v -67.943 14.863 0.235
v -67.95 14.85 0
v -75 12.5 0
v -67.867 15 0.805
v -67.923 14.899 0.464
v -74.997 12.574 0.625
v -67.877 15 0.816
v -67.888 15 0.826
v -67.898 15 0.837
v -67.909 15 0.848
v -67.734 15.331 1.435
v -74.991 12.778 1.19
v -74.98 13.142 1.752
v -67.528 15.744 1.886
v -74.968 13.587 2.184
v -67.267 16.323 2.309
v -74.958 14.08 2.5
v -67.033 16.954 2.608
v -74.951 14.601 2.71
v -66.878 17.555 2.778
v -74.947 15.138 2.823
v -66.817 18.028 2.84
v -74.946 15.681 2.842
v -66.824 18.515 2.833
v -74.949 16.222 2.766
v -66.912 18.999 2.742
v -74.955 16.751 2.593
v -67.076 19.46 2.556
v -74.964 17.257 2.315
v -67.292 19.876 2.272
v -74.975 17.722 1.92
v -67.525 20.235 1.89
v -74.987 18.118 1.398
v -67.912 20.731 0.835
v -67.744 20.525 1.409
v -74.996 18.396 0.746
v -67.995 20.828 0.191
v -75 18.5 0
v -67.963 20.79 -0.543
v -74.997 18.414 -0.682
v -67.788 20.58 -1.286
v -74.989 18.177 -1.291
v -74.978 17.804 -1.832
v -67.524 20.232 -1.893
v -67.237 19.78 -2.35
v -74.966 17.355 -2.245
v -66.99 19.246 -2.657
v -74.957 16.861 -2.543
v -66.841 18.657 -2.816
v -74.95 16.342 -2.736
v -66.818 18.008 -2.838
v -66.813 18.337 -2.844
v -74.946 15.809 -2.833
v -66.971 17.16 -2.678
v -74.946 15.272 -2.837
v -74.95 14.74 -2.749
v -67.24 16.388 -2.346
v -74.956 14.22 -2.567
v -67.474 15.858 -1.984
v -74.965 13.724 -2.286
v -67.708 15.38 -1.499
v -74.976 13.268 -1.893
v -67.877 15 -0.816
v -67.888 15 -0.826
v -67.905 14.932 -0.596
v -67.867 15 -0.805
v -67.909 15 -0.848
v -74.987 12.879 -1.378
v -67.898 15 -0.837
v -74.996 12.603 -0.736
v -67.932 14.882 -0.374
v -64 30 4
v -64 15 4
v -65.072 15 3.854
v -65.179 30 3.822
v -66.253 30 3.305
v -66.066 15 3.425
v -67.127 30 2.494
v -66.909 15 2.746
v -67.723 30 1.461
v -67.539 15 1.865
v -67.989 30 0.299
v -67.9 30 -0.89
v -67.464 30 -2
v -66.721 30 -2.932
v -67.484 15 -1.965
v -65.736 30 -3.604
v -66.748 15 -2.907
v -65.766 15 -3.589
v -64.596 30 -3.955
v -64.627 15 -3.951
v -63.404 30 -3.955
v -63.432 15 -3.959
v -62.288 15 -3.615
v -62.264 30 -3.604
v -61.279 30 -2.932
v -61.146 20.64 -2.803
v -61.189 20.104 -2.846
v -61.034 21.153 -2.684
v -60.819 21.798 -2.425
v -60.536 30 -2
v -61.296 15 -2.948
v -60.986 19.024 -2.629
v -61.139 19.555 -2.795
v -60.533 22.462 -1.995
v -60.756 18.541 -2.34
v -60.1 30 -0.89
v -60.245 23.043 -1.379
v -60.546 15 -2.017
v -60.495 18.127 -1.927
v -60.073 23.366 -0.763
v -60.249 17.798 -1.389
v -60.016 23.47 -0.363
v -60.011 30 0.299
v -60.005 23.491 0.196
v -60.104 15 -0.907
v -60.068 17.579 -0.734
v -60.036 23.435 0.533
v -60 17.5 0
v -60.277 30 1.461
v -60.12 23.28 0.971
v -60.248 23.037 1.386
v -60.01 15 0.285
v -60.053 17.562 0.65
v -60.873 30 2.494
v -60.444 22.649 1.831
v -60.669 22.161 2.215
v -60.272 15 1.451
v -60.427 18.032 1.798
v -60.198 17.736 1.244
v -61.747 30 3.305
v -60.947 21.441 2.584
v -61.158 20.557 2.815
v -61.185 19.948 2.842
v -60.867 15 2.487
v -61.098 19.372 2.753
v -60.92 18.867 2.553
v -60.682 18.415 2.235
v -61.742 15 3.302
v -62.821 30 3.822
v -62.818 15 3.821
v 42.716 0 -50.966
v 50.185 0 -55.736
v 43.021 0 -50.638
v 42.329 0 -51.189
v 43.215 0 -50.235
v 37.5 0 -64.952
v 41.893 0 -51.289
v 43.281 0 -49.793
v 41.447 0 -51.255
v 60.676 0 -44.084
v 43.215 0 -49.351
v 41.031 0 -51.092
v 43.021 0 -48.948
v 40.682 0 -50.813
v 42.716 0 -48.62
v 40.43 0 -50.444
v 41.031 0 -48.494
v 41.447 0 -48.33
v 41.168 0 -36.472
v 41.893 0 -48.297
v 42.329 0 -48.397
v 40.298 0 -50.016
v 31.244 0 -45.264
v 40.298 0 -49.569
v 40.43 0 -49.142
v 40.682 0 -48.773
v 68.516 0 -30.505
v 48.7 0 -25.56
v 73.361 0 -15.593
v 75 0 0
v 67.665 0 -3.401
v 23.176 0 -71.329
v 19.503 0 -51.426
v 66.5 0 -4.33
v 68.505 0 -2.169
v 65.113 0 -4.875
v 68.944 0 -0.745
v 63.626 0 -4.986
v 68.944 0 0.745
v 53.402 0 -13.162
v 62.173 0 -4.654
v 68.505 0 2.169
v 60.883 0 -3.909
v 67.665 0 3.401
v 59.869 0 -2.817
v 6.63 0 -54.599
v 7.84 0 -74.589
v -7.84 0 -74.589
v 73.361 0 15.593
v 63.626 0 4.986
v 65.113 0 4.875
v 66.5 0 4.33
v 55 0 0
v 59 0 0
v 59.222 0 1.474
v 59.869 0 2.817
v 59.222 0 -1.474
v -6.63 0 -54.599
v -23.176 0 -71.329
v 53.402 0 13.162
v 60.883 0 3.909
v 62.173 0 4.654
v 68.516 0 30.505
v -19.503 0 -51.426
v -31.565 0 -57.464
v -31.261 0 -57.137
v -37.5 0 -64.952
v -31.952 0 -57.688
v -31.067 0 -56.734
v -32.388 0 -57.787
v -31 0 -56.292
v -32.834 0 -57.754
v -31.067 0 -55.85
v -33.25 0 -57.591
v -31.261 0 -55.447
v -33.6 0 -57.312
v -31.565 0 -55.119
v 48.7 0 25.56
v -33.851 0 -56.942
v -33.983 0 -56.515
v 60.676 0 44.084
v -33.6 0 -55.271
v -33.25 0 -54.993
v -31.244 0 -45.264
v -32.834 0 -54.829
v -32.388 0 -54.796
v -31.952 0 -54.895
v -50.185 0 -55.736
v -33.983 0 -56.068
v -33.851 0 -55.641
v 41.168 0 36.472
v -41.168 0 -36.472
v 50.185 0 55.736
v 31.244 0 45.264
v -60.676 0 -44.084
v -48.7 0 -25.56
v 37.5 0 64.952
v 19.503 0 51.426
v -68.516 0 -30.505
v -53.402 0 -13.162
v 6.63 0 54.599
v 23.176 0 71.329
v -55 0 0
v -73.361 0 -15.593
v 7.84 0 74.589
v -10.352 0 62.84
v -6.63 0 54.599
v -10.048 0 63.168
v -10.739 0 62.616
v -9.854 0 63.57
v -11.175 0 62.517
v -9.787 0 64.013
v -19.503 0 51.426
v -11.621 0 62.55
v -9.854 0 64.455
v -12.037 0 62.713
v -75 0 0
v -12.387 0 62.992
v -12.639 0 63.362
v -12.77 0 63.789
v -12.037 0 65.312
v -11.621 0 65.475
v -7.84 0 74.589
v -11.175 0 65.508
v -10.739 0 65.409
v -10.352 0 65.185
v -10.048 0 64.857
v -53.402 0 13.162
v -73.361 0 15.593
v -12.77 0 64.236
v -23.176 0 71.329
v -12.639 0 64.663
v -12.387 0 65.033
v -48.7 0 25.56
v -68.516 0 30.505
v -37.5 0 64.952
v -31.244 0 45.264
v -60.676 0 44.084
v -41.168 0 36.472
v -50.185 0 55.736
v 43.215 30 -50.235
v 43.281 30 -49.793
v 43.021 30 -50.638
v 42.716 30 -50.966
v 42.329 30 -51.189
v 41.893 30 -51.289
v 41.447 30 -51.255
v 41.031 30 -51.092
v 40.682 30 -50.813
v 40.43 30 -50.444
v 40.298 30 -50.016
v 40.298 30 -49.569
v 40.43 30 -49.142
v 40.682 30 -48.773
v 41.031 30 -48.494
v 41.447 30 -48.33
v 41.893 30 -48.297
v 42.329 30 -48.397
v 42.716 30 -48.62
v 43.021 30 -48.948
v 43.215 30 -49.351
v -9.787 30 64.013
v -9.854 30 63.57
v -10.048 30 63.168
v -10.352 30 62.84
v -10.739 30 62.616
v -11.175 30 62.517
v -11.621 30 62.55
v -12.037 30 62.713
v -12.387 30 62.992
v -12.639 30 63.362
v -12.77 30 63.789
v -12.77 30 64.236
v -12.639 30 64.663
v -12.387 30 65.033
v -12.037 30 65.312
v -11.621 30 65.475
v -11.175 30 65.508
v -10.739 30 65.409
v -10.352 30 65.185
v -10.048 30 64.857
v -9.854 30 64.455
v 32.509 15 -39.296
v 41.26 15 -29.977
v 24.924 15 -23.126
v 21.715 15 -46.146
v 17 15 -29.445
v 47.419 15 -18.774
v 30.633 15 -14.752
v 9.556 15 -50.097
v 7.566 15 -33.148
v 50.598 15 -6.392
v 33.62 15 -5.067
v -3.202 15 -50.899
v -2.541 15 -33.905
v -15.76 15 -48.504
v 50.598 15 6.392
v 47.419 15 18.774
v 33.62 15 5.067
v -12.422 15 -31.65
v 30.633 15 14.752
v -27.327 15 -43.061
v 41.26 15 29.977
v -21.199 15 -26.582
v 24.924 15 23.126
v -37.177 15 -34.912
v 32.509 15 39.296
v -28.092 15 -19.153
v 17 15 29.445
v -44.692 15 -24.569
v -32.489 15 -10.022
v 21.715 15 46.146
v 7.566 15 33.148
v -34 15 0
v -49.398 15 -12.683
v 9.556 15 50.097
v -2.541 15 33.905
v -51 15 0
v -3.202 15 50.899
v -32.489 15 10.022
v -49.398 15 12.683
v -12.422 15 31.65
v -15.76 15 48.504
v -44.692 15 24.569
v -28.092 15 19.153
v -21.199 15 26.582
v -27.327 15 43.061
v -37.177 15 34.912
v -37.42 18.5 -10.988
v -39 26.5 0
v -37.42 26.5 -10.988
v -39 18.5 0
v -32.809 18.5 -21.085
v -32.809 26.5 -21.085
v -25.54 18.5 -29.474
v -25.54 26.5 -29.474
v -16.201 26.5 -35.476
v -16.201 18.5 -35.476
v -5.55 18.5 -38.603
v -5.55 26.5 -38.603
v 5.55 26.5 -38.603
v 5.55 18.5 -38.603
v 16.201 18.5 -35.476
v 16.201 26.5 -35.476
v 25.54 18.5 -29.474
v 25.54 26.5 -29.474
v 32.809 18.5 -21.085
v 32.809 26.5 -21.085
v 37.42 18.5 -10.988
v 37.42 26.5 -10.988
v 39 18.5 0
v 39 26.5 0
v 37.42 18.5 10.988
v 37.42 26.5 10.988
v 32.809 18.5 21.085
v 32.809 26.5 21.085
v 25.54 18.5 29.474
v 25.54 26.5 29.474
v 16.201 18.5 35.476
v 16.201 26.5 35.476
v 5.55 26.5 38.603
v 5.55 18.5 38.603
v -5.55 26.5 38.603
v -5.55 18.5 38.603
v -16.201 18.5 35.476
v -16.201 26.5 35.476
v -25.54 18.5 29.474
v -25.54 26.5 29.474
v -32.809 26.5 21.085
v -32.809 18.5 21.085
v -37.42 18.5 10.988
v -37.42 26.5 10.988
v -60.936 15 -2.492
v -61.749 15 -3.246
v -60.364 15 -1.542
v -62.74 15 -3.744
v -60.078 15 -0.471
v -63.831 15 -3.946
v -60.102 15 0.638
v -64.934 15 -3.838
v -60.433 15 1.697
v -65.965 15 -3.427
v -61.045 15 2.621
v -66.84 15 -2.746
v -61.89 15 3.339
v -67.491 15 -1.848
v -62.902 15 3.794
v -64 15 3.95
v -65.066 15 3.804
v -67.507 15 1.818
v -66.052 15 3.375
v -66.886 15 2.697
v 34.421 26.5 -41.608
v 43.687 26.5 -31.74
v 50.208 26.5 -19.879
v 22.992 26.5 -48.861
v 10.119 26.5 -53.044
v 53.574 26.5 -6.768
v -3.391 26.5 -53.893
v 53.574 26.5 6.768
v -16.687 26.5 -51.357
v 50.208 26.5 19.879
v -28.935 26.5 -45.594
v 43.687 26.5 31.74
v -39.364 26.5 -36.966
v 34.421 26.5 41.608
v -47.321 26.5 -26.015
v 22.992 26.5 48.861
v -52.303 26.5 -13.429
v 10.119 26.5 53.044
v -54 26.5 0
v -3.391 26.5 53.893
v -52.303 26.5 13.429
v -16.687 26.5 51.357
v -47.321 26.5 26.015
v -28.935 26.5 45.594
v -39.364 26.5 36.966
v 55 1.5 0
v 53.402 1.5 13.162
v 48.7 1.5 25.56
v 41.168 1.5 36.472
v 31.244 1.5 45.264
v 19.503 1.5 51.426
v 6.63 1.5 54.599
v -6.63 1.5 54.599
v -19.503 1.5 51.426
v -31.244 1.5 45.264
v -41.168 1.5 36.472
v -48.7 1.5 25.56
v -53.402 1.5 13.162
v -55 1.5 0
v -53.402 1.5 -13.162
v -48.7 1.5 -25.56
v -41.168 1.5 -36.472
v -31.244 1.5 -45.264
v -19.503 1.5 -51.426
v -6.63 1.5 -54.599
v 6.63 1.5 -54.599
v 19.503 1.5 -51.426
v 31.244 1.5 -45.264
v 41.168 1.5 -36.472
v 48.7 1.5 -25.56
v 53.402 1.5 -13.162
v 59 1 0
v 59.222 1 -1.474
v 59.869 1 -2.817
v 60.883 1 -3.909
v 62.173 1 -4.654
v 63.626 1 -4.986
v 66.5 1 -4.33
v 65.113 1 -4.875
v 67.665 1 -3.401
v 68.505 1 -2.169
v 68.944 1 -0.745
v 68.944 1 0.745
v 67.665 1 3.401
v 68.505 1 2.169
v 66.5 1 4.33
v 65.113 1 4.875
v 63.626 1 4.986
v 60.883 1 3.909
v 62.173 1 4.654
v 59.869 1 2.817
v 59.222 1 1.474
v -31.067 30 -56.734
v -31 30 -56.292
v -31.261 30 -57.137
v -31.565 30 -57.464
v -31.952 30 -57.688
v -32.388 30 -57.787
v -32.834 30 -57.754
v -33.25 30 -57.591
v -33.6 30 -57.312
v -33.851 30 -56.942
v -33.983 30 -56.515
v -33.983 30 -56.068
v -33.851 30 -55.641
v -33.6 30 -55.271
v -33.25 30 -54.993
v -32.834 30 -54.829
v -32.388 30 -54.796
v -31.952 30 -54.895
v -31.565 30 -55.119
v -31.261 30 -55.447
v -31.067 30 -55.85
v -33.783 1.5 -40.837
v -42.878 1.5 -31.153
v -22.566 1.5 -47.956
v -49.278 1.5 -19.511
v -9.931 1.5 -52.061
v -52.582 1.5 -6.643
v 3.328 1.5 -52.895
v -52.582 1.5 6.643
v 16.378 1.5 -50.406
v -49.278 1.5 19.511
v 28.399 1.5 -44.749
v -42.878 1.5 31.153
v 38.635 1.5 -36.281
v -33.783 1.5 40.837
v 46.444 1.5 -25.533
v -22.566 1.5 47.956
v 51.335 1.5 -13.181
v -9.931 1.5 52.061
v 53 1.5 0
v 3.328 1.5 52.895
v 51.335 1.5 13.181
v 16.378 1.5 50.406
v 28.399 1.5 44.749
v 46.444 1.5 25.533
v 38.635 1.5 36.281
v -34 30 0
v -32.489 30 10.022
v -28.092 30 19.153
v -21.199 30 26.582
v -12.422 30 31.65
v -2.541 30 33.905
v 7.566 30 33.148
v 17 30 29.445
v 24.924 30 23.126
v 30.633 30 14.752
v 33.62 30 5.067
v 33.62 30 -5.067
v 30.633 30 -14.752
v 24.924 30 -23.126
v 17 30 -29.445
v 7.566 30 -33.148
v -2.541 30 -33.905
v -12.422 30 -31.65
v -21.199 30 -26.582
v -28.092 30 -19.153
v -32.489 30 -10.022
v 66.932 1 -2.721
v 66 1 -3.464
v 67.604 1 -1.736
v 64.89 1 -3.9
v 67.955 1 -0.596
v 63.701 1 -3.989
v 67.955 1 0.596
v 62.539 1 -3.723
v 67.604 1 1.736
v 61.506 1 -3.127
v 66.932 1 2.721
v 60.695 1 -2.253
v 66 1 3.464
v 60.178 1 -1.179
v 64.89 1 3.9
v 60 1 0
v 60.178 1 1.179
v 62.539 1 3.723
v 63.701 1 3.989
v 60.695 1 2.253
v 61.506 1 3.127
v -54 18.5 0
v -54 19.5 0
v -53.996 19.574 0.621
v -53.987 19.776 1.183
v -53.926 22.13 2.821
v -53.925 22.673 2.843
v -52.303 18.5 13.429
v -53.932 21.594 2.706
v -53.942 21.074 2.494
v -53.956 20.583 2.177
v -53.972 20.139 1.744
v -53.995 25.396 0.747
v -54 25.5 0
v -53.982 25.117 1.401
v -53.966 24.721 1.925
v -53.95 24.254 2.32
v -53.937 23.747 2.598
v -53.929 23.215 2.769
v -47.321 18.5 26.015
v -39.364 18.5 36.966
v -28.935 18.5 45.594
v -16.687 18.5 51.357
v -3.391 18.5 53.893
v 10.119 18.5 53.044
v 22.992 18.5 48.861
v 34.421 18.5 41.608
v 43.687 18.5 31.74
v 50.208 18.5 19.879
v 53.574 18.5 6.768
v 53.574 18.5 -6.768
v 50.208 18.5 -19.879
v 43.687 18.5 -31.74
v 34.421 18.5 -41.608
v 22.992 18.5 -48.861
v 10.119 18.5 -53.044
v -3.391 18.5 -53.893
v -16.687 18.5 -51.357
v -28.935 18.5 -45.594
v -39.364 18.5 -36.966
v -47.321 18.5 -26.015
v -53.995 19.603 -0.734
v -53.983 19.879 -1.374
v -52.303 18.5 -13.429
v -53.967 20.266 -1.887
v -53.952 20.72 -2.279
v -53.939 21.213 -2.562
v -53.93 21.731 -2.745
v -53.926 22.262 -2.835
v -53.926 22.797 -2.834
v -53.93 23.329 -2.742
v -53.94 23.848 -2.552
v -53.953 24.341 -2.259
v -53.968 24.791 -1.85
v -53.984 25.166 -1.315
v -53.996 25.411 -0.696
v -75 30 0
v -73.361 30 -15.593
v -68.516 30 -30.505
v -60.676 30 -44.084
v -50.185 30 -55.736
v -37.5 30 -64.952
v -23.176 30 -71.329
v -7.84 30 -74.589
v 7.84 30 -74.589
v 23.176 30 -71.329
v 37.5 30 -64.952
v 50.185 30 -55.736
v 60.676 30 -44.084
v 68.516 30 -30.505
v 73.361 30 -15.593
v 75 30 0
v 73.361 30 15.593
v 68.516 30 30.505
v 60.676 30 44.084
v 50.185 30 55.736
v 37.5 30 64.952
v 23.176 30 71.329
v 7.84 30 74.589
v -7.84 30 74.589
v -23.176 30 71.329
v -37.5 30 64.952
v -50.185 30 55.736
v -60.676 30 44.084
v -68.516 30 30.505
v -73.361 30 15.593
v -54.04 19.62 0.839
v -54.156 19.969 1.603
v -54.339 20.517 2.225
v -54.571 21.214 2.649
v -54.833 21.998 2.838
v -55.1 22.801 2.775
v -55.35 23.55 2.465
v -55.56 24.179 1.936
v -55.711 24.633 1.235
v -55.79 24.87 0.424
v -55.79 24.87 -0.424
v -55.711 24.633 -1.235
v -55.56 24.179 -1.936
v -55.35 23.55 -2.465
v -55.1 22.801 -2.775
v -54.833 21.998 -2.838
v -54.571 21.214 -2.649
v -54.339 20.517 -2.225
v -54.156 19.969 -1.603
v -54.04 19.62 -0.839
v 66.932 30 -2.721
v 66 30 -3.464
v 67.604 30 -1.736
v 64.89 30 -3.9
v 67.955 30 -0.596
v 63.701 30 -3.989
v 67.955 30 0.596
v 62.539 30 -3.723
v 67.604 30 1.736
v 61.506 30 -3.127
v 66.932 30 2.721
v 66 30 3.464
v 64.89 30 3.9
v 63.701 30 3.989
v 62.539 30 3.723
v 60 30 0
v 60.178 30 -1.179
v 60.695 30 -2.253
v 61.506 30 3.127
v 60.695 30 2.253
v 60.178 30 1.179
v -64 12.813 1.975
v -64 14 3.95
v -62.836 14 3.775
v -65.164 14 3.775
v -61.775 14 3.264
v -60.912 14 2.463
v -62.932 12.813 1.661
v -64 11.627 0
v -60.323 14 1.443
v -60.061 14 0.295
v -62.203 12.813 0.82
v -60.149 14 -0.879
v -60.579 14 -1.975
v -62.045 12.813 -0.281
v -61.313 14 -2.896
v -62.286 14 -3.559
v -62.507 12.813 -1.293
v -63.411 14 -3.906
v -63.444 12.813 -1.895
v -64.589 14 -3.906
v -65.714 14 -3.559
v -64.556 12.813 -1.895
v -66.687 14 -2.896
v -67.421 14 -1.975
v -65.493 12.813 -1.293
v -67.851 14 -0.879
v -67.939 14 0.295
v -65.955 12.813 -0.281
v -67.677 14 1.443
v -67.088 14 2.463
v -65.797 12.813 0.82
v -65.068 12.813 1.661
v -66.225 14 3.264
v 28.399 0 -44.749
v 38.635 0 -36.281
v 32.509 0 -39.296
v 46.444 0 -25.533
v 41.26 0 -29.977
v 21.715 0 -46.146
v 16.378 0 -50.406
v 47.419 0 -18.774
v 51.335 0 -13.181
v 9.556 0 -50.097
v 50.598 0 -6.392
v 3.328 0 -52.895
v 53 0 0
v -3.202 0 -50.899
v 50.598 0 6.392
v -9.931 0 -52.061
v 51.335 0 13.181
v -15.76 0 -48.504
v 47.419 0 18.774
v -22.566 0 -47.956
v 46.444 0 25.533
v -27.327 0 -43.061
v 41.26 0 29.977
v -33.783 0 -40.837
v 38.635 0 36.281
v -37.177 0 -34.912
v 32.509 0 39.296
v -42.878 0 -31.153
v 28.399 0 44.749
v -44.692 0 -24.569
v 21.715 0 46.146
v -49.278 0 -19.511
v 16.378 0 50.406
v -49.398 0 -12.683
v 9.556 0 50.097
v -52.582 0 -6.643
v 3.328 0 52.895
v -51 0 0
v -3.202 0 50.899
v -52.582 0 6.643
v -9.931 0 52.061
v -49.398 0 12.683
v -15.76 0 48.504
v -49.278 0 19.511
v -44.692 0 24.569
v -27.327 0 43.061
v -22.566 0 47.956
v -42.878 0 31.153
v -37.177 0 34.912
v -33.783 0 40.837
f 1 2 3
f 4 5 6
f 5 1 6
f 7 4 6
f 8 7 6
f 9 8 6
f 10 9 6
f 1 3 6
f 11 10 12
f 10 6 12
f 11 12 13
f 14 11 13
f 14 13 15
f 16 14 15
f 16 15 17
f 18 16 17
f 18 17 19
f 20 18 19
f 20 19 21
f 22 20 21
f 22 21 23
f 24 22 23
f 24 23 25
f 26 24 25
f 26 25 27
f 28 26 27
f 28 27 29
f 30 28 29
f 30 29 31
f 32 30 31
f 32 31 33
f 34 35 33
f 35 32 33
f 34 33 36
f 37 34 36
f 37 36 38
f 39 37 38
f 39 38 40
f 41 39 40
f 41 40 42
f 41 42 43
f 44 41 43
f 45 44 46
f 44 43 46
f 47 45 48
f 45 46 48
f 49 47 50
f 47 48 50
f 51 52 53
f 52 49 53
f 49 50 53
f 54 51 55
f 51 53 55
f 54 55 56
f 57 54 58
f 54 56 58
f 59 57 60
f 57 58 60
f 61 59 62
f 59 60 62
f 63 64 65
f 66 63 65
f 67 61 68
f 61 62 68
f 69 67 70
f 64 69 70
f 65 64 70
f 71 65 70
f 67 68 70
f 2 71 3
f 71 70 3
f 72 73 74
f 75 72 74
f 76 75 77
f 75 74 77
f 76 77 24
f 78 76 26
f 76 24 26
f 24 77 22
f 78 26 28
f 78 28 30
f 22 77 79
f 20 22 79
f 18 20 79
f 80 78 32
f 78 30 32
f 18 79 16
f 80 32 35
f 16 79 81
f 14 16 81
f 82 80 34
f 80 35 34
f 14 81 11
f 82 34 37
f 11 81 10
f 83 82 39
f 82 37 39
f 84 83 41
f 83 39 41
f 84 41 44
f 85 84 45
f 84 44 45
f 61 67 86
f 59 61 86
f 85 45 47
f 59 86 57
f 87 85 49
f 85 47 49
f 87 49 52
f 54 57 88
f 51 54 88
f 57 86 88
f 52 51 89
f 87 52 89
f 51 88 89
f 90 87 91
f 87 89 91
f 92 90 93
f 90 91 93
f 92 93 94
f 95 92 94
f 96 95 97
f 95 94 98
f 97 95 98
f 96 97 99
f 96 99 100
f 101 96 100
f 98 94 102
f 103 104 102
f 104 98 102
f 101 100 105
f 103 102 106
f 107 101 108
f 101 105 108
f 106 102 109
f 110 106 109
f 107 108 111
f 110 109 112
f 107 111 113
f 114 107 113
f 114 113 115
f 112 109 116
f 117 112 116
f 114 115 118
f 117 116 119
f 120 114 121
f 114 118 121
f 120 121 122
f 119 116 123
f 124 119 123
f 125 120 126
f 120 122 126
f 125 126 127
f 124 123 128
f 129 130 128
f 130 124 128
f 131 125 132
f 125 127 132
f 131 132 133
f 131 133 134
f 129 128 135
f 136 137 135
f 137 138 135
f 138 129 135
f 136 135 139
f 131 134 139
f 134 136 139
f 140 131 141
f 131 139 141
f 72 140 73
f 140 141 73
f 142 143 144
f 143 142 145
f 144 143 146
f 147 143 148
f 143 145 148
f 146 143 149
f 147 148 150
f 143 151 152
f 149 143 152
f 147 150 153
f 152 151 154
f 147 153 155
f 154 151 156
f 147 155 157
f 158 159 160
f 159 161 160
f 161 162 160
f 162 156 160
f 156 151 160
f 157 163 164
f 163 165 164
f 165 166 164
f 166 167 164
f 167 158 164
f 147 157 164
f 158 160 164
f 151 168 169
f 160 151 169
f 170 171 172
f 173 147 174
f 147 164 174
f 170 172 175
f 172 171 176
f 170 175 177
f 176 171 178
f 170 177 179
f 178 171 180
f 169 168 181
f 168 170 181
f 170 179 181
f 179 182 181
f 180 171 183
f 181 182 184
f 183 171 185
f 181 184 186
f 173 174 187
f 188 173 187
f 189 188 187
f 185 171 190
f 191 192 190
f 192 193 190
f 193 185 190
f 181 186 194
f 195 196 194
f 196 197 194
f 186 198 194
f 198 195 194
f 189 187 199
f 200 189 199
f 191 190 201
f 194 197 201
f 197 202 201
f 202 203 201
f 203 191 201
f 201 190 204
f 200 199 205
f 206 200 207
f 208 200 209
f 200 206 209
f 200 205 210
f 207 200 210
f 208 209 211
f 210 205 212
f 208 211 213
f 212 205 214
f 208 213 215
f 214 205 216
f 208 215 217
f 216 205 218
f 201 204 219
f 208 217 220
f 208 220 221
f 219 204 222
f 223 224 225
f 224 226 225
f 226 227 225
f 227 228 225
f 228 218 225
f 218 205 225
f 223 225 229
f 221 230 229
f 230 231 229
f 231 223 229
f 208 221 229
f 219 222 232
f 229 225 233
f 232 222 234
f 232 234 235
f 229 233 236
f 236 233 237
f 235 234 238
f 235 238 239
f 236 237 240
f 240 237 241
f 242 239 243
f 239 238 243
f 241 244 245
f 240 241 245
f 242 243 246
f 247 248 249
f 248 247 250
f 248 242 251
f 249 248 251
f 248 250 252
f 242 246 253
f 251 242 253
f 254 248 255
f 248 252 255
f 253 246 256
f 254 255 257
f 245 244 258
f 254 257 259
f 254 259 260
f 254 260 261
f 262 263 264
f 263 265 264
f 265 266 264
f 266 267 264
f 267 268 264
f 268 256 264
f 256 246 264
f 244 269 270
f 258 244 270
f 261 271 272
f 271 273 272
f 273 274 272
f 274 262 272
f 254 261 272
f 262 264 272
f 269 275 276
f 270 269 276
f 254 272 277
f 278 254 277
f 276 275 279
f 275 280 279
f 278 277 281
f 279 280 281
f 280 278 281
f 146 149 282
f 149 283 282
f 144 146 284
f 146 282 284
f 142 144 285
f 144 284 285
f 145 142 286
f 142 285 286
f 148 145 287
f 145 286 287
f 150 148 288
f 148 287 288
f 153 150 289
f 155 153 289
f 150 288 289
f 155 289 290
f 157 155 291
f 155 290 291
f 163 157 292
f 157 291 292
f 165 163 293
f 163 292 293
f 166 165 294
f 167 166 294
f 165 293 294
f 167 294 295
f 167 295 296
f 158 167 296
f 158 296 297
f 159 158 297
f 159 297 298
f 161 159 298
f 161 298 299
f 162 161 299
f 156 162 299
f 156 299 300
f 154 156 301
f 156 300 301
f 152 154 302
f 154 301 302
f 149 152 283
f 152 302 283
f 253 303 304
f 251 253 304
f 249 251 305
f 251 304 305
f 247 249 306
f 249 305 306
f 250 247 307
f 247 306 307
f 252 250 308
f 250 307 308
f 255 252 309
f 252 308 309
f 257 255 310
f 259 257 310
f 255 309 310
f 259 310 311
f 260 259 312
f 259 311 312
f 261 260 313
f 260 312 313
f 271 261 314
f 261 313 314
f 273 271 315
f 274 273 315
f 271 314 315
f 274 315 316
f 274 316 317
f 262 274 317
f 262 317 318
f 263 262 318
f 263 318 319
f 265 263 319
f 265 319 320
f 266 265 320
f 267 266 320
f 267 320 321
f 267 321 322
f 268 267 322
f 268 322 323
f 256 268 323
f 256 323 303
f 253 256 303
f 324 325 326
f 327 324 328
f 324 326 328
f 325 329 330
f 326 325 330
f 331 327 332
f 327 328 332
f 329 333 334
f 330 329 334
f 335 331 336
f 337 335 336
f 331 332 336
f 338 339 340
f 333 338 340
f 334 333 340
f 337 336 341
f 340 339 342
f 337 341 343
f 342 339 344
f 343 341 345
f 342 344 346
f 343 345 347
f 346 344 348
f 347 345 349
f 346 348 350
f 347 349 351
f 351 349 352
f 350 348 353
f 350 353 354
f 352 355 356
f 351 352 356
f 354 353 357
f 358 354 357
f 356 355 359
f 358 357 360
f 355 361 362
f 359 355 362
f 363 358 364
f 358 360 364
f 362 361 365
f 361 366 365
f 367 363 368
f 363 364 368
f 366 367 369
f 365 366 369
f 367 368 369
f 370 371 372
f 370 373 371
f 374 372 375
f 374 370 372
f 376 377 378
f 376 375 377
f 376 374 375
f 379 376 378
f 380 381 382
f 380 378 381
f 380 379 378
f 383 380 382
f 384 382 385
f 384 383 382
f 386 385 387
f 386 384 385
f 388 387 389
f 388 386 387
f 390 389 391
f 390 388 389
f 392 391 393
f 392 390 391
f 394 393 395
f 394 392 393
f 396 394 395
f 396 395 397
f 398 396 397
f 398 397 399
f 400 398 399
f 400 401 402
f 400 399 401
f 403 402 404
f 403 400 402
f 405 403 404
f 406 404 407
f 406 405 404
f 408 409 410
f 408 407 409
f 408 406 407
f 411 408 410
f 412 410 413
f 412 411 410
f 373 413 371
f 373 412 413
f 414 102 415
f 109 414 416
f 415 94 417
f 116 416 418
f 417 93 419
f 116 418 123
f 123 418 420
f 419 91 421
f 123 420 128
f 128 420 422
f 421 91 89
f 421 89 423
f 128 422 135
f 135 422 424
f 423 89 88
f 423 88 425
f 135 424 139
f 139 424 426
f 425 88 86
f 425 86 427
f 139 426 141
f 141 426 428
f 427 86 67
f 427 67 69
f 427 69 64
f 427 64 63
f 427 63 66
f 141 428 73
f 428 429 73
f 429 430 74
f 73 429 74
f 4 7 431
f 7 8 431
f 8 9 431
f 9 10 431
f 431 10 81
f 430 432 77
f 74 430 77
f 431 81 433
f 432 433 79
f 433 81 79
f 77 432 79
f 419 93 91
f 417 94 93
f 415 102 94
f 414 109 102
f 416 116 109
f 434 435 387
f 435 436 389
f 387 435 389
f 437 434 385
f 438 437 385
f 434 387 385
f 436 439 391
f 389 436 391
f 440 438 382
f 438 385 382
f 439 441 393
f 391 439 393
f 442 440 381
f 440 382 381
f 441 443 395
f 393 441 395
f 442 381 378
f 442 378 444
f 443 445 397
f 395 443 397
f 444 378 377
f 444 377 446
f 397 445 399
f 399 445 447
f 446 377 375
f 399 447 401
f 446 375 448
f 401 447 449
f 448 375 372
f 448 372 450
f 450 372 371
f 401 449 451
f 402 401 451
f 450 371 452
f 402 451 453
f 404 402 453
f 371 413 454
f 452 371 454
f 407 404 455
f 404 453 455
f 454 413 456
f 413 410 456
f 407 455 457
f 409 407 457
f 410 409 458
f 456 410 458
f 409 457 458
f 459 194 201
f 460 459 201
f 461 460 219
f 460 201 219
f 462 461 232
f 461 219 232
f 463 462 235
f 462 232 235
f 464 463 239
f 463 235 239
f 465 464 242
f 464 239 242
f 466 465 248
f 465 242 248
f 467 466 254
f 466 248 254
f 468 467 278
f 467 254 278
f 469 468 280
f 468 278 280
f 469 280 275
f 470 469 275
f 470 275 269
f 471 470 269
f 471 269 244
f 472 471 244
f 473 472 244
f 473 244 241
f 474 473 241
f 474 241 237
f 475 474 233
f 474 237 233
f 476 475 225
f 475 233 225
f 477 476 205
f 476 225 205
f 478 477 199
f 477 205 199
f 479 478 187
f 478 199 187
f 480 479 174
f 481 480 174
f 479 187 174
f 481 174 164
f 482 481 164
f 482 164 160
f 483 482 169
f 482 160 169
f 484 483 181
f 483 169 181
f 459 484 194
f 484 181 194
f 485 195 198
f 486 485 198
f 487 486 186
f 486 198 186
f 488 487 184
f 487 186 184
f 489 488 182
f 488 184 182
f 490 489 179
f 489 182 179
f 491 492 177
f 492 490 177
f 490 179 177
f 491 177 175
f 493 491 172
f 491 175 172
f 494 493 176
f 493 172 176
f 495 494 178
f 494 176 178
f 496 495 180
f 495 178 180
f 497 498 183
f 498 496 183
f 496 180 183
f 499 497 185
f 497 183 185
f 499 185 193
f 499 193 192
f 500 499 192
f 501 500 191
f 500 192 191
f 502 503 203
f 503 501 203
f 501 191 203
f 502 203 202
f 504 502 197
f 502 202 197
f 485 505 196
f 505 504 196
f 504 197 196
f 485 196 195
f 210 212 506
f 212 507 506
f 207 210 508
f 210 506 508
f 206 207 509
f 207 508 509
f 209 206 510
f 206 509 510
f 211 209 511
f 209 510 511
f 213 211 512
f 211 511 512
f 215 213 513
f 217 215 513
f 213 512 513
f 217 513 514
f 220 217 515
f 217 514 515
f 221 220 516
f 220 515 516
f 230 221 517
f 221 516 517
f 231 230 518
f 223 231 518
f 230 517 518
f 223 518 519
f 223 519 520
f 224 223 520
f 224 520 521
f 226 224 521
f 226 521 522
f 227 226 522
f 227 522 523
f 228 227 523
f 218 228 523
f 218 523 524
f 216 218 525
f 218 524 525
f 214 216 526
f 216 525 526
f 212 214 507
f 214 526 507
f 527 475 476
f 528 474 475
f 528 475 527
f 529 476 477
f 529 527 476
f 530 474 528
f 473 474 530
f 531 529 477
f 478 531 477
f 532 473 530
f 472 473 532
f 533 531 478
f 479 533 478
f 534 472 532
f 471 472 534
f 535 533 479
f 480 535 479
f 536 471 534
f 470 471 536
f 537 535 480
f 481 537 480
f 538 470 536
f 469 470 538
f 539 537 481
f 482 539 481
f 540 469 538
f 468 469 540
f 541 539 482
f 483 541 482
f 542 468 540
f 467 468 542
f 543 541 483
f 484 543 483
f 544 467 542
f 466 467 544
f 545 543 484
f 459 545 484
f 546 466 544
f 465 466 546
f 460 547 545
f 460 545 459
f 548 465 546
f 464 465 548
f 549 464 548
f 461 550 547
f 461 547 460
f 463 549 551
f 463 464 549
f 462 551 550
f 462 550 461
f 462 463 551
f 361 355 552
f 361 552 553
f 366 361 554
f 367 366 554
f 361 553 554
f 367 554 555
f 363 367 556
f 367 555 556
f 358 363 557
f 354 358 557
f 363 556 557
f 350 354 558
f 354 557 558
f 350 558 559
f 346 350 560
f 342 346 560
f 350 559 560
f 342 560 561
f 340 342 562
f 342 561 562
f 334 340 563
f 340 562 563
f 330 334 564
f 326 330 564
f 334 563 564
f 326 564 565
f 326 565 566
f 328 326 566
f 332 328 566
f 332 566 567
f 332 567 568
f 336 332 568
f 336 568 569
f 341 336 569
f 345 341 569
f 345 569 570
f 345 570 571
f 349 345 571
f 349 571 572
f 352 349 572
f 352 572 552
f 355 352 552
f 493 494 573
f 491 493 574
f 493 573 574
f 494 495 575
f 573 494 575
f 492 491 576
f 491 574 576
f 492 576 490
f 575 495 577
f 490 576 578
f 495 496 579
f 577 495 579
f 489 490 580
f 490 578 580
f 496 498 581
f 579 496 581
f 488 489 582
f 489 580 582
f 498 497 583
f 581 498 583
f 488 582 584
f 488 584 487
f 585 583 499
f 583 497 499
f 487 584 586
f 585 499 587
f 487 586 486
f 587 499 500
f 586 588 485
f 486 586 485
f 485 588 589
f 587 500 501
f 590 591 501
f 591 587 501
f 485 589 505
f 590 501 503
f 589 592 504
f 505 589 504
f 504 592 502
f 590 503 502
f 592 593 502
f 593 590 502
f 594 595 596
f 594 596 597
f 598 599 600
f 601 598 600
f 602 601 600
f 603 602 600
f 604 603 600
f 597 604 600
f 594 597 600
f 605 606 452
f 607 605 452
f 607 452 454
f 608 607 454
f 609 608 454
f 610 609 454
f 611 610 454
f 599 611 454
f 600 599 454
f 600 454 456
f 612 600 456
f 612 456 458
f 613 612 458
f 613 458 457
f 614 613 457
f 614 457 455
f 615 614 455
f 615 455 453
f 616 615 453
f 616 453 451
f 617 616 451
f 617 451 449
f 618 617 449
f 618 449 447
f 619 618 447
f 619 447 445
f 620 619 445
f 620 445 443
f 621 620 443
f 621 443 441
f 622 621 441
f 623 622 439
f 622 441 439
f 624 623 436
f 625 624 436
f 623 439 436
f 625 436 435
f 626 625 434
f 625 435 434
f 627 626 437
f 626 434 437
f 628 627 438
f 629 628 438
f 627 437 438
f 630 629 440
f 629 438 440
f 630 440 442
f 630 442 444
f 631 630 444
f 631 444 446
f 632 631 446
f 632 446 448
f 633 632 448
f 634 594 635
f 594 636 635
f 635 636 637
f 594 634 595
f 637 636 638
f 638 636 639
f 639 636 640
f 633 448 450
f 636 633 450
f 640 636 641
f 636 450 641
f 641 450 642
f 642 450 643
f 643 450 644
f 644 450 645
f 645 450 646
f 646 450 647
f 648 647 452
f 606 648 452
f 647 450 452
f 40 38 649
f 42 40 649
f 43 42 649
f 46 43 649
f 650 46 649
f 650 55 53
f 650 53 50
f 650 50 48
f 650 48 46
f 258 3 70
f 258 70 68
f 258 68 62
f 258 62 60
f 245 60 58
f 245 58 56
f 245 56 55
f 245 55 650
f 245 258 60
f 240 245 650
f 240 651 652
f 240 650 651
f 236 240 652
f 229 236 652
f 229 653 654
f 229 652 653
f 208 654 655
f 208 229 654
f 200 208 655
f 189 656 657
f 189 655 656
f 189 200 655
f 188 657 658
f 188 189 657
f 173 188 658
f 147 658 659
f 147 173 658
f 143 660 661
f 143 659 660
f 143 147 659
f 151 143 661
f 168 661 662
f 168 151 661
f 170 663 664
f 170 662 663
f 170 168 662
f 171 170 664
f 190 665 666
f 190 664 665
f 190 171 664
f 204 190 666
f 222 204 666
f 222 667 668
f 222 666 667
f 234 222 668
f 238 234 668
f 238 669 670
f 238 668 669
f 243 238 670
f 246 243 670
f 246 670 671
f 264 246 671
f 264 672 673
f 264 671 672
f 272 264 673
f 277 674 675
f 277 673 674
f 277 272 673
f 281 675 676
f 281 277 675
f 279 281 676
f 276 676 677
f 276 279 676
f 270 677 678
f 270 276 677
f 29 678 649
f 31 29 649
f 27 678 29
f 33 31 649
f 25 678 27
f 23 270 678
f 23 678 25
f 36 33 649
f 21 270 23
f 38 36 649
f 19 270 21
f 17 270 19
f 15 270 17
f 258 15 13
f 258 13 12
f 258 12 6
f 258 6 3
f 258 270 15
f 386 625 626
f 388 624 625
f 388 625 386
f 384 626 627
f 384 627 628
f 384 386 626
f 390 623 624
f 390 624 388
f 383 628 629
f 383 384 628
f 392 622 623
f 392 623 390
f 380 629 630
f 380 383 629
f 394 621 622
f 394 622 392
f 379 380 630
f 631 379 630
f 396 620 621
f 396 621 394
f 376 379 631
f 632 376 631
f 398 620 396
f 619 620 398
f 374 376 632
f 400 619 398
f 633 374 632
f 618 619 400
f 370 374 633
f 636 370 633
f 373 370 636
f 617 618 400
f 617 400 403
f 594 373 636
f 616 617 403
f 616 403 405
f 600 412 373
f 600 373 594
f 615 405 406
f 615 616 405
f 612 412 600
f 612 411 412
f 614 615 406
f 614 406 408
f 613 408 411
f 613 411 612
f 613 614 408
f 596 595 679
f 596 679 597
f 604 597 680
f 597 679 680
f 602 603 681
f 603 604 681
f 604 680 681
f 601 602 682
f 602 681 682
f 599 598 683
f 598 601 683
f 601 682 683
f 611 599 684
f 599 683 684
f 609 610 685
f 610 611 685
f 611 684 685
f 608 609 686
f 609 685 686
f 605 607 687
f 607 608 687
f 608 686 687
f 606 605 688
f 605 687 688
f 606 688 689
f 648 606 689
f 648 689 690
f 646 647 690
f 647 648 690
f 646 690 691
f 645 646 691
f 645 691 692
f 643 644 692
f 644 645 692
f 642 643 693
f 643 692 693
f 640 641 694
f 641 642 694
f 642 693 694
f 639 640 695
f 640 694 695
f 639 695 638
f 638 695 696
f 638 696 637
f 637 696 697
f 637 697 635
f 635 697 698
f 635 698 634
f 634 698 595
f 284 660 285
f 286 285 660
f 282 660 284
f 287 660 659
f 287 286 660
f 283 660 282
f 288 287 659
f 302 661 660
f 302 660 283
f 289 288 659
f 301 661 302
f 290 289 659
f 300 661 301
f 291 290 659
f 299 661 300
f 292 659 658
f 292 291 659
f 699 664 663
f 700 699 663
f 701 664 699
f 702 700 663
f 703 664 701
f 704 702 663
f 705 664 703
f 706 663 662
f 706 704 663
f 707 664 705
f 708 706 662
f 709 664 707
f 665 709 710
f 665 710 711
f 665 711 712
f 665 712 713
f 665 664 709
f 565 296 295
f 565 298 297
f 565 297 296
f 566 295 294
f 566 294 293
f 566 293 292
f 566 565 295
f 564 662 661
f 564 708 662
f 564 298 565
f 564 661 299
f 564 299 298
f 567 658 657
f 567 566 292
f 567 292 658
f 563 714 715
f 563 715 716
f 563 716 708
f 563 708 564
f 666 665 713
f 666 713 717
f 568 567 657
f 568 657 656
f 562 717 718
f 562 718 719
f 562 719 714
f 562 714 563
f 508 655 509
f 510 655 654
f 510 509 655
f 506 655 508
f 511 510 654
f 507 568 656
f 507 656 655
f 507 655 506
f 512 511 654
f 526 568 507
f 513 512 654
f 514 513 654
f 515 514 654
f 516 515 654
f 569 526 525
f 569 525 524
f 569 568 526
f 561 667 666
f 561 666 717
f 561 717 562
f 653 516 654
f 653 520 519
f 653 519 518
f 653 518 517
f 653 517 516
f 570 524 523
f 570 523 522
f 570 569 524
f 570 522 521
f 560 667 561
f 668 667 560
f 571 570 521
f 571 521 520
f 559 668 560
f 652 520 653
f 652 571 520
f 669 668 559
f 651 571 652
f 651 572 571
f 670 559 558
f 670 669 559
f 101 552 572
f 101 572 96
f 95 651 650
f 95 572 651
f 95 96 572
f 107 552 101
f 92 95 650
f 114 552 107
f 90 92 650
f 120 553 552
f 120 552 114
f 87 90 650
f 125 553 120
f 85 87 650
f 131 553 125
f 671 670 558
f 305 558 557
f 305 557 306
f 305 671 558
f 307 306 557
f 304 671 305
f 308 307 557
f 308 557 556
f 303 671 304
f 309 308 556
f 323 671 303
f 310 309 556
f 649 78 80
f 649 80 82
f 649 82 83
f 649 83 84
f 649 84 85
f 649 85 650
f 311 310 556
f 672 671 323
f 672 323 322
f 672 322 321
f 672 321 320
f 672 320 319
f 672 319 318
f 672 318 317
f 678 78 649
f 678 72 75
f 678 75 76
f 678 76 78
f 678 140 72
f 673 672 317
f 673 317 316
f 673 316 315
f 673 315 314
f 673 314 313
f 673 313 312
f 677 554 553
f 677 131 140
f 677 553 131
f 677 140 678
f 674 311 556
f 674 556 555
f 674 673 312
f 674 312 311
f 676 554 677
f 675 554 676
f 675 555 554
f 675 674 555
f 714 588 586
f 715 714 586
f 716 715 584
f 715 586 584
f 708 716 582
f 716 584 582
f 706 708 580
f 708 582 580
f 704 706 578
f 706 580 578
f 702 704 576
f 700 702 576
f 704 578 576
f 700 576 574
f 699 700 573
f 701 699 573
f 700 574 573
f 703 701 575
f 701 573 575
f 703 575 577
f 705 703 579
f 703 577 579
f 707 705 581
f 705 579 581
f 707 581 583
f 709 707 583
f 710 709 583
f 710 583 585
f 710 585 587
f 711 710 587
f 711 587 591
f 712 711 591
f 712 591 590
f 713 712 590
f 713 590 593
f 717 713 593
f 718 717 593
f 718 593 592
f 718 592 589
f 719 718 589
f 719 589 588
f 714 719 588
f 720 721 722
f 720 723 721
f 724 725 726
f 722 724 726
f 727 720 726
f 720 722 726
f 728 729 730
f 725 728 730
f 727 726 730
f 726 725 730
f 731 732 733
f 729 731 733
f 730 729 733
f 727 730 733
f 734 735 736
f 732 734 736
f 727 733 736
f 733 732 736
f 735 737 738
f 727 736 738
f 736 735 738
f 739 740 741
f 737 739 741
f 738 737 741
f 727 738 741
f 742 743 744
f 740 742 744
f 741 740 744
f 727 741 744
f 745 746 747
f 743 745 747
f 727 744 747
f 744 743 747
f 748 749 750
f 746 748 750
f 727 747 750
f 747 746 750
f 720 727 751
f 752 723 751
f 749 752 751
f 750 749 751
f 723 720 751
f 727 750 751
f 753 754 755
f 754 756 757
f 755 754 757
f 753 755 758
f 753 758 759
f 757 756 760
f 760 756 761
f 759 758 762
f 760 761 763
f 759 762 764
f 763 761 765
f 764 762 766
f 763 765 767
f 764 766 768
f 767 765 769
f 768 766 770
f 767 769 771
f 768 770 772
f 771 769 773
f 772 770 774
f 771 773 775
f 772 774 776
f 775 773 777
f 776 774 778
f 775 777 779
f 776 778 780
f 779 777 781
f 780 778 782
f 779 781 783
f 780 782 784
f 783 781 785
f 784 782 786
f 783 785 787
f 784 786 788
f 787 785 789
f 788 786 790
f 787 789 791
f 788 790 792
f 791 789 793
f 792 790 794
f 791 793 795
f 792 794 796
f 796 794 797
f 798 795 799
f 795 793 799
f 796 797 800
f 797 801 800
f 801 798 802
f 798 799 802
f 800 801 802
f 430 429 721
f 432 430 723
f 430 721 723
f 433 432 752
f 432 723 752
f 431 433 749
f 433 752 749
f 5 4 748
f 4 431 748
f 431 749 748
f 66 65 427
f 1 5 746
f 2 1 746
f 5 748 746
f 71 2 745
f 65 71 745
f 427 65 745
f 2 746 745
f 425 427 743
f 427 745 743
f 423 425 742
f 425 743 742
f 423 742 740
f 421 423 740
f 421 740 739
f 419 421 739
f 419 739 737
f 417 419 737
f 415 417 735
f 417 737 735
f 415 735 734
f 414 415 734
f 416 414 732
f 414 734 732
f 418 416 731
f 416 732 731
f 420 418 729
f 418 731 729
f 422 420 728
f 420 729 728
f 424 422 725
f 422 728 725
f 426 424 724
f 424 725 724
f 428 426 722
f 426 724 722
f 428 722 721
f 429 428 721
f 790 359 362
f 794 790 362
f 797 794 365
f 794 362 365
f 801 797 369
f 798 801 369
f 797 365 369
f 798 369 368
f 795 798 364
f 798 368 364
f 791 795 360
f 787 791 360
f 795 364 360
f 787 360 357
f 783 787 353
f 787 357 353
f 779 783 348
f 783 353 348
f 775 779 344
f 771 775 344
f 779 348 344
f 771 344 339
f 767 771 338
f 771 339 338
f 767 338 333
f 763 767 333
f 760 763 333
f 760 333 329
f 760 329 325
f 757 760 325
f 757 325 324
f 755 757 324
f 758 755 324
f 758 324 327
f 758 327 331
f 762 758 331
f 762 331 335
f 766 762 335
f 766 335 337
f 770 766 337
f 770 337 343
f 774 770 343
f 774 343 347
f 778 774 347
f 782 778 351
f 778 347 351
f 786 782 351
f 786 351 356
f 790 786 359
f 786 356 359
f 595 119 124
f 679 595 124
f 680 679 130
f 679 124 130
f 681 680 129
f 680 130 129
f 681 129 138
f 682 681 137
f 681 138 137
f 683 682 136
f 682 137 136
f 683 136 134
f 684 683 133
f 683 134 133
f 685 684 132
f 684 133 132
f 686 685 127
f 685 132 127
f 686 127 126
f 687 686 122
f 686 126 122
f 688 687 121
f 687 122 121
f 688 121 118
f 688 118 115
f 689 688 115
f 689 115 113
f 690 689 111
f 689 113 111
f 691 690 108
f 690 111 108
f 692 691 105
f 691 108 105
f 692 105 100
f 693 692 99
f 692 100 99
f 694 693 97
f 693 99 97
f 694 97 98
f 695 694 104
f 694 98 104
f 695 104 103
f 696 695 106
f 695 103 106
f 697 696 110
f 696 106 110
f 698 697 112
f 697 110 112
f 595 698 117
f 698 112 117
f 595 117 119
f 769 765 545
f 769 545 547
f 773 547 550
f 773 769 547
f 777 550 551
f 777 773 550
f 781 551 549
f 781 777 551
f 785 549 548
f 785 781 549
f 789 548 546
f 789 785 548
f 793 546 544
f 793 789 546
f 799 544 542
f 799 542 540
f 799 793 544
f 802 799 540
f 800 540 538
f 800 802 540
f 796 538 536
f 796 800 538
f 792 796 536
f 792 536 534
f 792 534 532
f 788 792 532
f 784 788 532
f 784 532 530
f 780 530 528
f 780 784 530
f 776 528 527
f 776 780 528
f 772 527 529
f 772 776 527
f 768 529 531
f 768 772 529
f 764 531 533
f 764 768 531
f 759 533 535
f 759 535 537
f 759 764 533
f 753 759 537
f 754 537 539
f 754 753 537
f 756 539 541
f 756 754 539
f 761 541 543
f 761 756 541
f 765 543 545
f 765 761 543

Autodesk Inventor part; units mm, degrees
ref_plane "YZ Plane" through (0, 0, 0) normal (1, 0, 0) x (0, 1, 0)
ref_plane "XZ Plane" through (0, 0, 0) normal (0, 1, 0) x (-1, 0, 0)
ref_plane "XY Plane" through (0, 0, 0) normal (0, 0, 1) x (1, 0, 0)
sketch "Эскиз1" plane through (0, 0, 0) normal (0, 0, 1) x (1, 0, 0)
  line L0 (0, 0) -> (0, 20)
  line L1 (0, 0) -> (0, 24)
  line L2 (0, 0) -> (0, 30)
  line L3 (0, 30) -> (-75, 30)
  line L4 (-75, 30) -> (-75, 0)
  line L5 (-75, 0) -> (-51, 0)
  line L6 (-51, 0) -> (-51, 15)
  line L7 (-51, 15) -> (-34, 15)
  line L8 (-34, 15) -> (-34, 30)
  line L9 (-54, 26.5) -> (-39, 26.5)
  line L10 (-39, 26.5) -> (-39, 18.5)
  line L11 (-39, 18.5) -> (-54, 18.5)
  line L12 (-54, 18.5) -> (-54, 26.5)
  dimension "d20" = 30
  dimension "d21" = 75
  dimension "d22" = 24
  dimension "d23" = 15
  dimension "d24" = 17
  dimension "d46" = 8
  dimension "d47" = 3.5
revolve "Вращение1" add sketch "Эскиз1" angle 360 about axis through (0, 0, 0) along (0, 1, 0)
sketch "Эскиз2" plane through (0, 30, 0) normal (0, 1, 0) x (1, 0, 0)
  circle A0 centre (0, 0) radius 32
  circle A1 centre (0, 0) radius 69
  line L0 (0, 0) -> (41.781195, 49.792889)
  line L1 (0, 0) -> (65, 0) construction
  circle A2 centre (41.781195, 49.792889) radius 1.5
  line L2 (0, 0) -> (-32.5, 56.291651)
  line L3 (0, 0) -> (65, 0) construction
  circle A3 centre (-32.5, 56.291651) radius 1.5
  line L4 (0, 0) -> (-11.287132, -64.012504)
  line L5 (0, 0) -> (65, 0) construction
  circle A4 centre (-11.287132, -64.012504) radius 1.5
  dimension "d8" = 65
  dimension "d9" = 50
  dimension "d10" = 3
  dimension "d11" = 65
  dimension "d12" = 120
  dimension "d13" = 3
  dimension "d14" = 65
  dimension "d15" = 100
  dimension "d16" = 3
extrude "Выдавливание1" cut sketch "Эскиз2" against normal through all contours A2 | A3 | A4
sketch "Эскиз3" plane through (0, 0, 0) normal (0, 1, 0) x (-1, 0, 0)
  circle A0 centre (11.287132, 64.012504) radius 1.5
  circle A1 centre (-41.781195, -49.792889) radius 1.5
  circle A2 centre (32.5, -56.291651) radius 1.5
  circle A3 centre (0, 0) radius 75
  circle A4 centre (0, 0) radius 34
  circle A5 centre (-64, 0) radius 4
  dimension "d44" = 64
  dimension "d45" = 8
extrude "Выдавливание2" cut sketch "Эскиз3" along normal through all contours A5
sketch "Эскиз4" plane through (0, 0, 0) normal (0, 1, 0) x (-1, 0, 0)
  circle A0 centre (-64, 0) radius 4 projected
  circle A1 centre (-64, 0) radius 5
  point P0 (0, 0)
  dimension "d27" = 10
extrude "Выдавливание3" cut sketch "Эскиз4" along normal blind 1
sketch "Эскиз5" plane through (0, 30, 0) normal (0, 1, 0) x (-1, 0, 0)
  line L0 (0, 0) -> (64, 0)
  dimension "d30" = 64
hole "Отверстие1" at (-64, 30, 0) direction (0, -1, 0) diameter 7.9 depth 16 tip angle 118 counterbore diameter 8 counterbore depth 15
sketch "Эскиз6" plane through (0, 0, 0) normal (0, 0, 1) x (1, 0, 0)
  line L0 (-54, 18.5) -> (54, 18.5)
  line L1 (-60, 15) -> (-60, 30)
  line L2 (-54, 18.5) -> (-60, 18.5)
  line L3 (-60, 18.5) -> (-60, 20.5)
  line L4 (-60, 15) -> (-60, 30)
  line L5 (-60, 20.5) -> (-54, 22.5)
  line L6 (-54, 18.5) -> (-54, 26.5)
  line L7 (-54, 22.5) -> (-54, 19.5)
  line L8 (-54, 18.5) -> (-54, 26.5)
  line L9 (-54, 19.5) -> (-77.955347, 11.514884)
  line L10 (-77.955347, 11.514884) -> (-78.855347, 14.214884)
  line L11 (-78.855347, 14.214884) -> (-52.662823, 22.945726)
  line L12 (-52.662823, 22.945726) -> (-51.762823, 20.245726)
  line L13 (-51.762823, 20.245726) -> (-54, 19.5)
  point P0 (0, 0)
  dimension "d54" = 2
  dimension "d55" = 3
revolve "Вращение2" cut sketch "Эскиз6" angle 360 about axis through (-78.855347, 14.214884, 0) along (0.9486833, 0.3162278, 0) contours L1 L9 L10 L11 | L2 L9 L1 | L1 L5 L6 L9 L2 | L11 L12 L13 L6
sketch "Эскиз7" plane through (0, 0, 0) normal (0, -1, 0) x (1, 0, 0)
  circle A0 centre (0, 0) radius 53
  circle A1 centre (0, 0) radius 54 projected
  circle A2 centre (0, 0) radius 55
  dimension "d48" = 106
  dimension "d49" = 110
extrude "Выдавливание4" cut sketch "Эскиз7" against normal blind 1.5 contours A1 | A2
properties part number "Корпус сальника 1" material "Чугун, серый"
